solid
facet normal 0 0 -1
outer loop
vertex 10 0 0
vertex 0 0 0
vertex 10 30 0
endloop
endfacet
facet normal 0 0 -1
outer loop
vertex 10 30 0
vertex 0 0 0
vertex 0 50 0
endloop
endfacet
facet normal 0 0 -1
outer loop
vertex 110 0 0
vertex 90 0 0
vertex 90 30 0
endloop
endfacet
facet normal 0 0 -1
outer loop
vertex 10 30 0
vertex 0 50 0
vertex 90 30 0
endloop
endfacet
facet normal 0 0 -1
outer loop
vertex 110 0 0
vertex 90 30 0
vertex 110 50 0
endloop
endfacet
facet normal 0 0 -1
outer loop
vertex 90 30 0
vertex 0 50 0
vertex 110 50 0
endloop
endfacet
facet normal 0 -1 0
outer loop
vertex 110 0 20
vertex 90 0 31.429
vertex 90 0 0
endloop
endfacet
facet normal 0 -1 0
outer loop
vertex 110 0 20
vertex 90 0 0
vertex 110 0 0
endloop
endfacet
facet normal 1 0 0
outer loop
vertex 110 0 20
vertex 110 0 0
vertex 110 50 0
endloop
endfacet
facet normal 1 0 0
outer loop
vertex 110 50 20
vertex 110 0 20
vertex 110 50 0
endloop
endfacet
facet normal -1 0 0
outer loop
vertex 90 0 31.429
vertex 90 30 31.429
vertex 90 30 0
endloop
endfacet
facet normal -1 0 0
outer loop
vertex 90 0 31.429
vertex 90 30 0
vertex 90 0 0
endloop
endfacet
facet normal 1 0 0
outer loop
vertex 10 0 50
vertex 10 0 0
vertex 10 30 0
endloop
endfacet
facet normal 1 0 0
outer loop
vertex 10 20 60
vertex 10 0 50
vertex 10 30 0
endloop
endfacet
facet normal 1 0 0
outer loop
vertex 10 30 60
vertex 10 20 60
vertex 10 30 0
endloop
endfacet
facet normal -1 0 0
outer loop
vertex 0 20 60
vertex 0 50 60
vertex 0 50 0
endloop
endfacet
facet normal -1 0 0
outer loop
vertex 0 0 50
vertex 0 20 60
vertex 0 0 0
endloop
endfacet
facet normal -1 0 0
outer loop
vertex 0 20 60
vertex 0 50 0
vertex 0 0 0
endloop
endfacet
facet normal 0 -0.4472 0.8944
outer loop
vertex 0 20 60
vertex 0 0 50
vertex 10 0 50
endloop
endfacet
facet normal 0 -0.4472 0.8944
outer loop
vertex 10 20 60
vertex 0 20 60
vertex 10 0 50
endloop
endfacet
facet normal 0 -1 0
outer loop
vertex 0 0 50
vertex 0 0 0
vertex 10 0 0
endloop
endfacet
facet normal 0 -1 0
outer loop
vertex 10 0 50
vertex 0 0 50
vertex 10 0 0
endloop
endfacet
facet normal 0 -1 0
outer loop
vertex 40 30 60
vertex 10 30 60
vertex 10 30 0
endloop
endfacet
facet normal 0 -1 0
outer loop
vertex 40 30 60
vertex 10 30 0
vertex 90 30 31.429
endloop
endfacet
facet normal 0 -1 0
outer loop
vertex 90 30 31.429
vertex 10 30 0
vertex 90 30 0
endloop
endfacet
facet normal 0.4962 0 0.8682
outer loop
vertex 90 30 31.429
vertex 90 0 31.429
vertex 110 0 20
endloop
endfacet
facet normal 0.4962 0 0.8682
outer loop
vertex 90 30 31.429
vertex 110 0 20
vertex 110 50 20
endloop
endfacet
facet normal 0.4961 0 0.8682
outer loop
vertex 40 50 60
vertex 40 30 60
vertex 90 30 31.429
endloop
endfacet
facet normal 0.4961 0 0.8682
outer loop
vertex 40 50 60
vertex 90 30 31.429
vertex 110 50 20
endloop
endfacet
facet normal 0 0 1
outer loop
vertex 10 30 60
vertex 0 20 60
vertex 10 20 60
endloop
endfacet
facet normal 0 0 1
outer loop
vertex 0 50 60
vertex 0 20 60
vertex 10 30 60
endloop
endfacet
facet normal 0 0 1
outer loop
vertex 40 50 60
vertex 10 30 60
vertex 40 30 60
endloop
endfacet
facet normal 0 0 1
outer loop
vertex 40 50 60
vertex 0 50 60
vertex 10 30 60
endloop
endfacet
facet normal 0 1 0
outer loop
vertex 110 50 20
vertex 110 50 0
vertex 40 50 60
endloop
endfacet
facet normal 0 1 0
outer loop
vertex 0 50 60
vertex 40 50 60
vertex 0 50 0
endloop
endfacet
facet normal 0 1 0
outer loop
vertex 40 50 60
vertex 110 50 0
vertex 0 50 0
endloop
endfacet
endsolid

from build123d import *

# Parameters (mm, degrees)
F1_DEPTH = 60
F2_SIZE2 = 10
F2_SIZE  = 20
F3_SIZE2 = 70
F3_SIZE  = 40


with BuildPart() as f1:
    # F0 (on Top) → F1 (new body)
    with BuildSketch(Plane.XY):
        Polygon((0, 50), (0, 0), (10, 0), (10, 30), (90, 30), (90, 0), (110, 0), (110, 50), align=None)
    extrude(amount=F1_DEPTH)

    # F2
    f2_edges = [f1.edges().sort_by_distance(p)[0] for p in [
        (5, 0, 60),
    ]]
    f2_side = f1.faces().sort_by_distance((58.870968, 32.741935, 60))[0]
    chamfer(f2_edges, length=F2_SIZE, length2=F2_SIZE2, reference=f2_side)

    # F3
    f3_edges = [f1.edges().sort_by_distance(p)[0] for p in [
        (110, 25, 60),
    ]]
    f3_side = f1.faces().sort_by_distance((110, 25, 30))[0]
    chamfer(f3_edges, length=F3_SIZE, length2=F3_SIZE2, reference=f3_side)


solid = f1.part
